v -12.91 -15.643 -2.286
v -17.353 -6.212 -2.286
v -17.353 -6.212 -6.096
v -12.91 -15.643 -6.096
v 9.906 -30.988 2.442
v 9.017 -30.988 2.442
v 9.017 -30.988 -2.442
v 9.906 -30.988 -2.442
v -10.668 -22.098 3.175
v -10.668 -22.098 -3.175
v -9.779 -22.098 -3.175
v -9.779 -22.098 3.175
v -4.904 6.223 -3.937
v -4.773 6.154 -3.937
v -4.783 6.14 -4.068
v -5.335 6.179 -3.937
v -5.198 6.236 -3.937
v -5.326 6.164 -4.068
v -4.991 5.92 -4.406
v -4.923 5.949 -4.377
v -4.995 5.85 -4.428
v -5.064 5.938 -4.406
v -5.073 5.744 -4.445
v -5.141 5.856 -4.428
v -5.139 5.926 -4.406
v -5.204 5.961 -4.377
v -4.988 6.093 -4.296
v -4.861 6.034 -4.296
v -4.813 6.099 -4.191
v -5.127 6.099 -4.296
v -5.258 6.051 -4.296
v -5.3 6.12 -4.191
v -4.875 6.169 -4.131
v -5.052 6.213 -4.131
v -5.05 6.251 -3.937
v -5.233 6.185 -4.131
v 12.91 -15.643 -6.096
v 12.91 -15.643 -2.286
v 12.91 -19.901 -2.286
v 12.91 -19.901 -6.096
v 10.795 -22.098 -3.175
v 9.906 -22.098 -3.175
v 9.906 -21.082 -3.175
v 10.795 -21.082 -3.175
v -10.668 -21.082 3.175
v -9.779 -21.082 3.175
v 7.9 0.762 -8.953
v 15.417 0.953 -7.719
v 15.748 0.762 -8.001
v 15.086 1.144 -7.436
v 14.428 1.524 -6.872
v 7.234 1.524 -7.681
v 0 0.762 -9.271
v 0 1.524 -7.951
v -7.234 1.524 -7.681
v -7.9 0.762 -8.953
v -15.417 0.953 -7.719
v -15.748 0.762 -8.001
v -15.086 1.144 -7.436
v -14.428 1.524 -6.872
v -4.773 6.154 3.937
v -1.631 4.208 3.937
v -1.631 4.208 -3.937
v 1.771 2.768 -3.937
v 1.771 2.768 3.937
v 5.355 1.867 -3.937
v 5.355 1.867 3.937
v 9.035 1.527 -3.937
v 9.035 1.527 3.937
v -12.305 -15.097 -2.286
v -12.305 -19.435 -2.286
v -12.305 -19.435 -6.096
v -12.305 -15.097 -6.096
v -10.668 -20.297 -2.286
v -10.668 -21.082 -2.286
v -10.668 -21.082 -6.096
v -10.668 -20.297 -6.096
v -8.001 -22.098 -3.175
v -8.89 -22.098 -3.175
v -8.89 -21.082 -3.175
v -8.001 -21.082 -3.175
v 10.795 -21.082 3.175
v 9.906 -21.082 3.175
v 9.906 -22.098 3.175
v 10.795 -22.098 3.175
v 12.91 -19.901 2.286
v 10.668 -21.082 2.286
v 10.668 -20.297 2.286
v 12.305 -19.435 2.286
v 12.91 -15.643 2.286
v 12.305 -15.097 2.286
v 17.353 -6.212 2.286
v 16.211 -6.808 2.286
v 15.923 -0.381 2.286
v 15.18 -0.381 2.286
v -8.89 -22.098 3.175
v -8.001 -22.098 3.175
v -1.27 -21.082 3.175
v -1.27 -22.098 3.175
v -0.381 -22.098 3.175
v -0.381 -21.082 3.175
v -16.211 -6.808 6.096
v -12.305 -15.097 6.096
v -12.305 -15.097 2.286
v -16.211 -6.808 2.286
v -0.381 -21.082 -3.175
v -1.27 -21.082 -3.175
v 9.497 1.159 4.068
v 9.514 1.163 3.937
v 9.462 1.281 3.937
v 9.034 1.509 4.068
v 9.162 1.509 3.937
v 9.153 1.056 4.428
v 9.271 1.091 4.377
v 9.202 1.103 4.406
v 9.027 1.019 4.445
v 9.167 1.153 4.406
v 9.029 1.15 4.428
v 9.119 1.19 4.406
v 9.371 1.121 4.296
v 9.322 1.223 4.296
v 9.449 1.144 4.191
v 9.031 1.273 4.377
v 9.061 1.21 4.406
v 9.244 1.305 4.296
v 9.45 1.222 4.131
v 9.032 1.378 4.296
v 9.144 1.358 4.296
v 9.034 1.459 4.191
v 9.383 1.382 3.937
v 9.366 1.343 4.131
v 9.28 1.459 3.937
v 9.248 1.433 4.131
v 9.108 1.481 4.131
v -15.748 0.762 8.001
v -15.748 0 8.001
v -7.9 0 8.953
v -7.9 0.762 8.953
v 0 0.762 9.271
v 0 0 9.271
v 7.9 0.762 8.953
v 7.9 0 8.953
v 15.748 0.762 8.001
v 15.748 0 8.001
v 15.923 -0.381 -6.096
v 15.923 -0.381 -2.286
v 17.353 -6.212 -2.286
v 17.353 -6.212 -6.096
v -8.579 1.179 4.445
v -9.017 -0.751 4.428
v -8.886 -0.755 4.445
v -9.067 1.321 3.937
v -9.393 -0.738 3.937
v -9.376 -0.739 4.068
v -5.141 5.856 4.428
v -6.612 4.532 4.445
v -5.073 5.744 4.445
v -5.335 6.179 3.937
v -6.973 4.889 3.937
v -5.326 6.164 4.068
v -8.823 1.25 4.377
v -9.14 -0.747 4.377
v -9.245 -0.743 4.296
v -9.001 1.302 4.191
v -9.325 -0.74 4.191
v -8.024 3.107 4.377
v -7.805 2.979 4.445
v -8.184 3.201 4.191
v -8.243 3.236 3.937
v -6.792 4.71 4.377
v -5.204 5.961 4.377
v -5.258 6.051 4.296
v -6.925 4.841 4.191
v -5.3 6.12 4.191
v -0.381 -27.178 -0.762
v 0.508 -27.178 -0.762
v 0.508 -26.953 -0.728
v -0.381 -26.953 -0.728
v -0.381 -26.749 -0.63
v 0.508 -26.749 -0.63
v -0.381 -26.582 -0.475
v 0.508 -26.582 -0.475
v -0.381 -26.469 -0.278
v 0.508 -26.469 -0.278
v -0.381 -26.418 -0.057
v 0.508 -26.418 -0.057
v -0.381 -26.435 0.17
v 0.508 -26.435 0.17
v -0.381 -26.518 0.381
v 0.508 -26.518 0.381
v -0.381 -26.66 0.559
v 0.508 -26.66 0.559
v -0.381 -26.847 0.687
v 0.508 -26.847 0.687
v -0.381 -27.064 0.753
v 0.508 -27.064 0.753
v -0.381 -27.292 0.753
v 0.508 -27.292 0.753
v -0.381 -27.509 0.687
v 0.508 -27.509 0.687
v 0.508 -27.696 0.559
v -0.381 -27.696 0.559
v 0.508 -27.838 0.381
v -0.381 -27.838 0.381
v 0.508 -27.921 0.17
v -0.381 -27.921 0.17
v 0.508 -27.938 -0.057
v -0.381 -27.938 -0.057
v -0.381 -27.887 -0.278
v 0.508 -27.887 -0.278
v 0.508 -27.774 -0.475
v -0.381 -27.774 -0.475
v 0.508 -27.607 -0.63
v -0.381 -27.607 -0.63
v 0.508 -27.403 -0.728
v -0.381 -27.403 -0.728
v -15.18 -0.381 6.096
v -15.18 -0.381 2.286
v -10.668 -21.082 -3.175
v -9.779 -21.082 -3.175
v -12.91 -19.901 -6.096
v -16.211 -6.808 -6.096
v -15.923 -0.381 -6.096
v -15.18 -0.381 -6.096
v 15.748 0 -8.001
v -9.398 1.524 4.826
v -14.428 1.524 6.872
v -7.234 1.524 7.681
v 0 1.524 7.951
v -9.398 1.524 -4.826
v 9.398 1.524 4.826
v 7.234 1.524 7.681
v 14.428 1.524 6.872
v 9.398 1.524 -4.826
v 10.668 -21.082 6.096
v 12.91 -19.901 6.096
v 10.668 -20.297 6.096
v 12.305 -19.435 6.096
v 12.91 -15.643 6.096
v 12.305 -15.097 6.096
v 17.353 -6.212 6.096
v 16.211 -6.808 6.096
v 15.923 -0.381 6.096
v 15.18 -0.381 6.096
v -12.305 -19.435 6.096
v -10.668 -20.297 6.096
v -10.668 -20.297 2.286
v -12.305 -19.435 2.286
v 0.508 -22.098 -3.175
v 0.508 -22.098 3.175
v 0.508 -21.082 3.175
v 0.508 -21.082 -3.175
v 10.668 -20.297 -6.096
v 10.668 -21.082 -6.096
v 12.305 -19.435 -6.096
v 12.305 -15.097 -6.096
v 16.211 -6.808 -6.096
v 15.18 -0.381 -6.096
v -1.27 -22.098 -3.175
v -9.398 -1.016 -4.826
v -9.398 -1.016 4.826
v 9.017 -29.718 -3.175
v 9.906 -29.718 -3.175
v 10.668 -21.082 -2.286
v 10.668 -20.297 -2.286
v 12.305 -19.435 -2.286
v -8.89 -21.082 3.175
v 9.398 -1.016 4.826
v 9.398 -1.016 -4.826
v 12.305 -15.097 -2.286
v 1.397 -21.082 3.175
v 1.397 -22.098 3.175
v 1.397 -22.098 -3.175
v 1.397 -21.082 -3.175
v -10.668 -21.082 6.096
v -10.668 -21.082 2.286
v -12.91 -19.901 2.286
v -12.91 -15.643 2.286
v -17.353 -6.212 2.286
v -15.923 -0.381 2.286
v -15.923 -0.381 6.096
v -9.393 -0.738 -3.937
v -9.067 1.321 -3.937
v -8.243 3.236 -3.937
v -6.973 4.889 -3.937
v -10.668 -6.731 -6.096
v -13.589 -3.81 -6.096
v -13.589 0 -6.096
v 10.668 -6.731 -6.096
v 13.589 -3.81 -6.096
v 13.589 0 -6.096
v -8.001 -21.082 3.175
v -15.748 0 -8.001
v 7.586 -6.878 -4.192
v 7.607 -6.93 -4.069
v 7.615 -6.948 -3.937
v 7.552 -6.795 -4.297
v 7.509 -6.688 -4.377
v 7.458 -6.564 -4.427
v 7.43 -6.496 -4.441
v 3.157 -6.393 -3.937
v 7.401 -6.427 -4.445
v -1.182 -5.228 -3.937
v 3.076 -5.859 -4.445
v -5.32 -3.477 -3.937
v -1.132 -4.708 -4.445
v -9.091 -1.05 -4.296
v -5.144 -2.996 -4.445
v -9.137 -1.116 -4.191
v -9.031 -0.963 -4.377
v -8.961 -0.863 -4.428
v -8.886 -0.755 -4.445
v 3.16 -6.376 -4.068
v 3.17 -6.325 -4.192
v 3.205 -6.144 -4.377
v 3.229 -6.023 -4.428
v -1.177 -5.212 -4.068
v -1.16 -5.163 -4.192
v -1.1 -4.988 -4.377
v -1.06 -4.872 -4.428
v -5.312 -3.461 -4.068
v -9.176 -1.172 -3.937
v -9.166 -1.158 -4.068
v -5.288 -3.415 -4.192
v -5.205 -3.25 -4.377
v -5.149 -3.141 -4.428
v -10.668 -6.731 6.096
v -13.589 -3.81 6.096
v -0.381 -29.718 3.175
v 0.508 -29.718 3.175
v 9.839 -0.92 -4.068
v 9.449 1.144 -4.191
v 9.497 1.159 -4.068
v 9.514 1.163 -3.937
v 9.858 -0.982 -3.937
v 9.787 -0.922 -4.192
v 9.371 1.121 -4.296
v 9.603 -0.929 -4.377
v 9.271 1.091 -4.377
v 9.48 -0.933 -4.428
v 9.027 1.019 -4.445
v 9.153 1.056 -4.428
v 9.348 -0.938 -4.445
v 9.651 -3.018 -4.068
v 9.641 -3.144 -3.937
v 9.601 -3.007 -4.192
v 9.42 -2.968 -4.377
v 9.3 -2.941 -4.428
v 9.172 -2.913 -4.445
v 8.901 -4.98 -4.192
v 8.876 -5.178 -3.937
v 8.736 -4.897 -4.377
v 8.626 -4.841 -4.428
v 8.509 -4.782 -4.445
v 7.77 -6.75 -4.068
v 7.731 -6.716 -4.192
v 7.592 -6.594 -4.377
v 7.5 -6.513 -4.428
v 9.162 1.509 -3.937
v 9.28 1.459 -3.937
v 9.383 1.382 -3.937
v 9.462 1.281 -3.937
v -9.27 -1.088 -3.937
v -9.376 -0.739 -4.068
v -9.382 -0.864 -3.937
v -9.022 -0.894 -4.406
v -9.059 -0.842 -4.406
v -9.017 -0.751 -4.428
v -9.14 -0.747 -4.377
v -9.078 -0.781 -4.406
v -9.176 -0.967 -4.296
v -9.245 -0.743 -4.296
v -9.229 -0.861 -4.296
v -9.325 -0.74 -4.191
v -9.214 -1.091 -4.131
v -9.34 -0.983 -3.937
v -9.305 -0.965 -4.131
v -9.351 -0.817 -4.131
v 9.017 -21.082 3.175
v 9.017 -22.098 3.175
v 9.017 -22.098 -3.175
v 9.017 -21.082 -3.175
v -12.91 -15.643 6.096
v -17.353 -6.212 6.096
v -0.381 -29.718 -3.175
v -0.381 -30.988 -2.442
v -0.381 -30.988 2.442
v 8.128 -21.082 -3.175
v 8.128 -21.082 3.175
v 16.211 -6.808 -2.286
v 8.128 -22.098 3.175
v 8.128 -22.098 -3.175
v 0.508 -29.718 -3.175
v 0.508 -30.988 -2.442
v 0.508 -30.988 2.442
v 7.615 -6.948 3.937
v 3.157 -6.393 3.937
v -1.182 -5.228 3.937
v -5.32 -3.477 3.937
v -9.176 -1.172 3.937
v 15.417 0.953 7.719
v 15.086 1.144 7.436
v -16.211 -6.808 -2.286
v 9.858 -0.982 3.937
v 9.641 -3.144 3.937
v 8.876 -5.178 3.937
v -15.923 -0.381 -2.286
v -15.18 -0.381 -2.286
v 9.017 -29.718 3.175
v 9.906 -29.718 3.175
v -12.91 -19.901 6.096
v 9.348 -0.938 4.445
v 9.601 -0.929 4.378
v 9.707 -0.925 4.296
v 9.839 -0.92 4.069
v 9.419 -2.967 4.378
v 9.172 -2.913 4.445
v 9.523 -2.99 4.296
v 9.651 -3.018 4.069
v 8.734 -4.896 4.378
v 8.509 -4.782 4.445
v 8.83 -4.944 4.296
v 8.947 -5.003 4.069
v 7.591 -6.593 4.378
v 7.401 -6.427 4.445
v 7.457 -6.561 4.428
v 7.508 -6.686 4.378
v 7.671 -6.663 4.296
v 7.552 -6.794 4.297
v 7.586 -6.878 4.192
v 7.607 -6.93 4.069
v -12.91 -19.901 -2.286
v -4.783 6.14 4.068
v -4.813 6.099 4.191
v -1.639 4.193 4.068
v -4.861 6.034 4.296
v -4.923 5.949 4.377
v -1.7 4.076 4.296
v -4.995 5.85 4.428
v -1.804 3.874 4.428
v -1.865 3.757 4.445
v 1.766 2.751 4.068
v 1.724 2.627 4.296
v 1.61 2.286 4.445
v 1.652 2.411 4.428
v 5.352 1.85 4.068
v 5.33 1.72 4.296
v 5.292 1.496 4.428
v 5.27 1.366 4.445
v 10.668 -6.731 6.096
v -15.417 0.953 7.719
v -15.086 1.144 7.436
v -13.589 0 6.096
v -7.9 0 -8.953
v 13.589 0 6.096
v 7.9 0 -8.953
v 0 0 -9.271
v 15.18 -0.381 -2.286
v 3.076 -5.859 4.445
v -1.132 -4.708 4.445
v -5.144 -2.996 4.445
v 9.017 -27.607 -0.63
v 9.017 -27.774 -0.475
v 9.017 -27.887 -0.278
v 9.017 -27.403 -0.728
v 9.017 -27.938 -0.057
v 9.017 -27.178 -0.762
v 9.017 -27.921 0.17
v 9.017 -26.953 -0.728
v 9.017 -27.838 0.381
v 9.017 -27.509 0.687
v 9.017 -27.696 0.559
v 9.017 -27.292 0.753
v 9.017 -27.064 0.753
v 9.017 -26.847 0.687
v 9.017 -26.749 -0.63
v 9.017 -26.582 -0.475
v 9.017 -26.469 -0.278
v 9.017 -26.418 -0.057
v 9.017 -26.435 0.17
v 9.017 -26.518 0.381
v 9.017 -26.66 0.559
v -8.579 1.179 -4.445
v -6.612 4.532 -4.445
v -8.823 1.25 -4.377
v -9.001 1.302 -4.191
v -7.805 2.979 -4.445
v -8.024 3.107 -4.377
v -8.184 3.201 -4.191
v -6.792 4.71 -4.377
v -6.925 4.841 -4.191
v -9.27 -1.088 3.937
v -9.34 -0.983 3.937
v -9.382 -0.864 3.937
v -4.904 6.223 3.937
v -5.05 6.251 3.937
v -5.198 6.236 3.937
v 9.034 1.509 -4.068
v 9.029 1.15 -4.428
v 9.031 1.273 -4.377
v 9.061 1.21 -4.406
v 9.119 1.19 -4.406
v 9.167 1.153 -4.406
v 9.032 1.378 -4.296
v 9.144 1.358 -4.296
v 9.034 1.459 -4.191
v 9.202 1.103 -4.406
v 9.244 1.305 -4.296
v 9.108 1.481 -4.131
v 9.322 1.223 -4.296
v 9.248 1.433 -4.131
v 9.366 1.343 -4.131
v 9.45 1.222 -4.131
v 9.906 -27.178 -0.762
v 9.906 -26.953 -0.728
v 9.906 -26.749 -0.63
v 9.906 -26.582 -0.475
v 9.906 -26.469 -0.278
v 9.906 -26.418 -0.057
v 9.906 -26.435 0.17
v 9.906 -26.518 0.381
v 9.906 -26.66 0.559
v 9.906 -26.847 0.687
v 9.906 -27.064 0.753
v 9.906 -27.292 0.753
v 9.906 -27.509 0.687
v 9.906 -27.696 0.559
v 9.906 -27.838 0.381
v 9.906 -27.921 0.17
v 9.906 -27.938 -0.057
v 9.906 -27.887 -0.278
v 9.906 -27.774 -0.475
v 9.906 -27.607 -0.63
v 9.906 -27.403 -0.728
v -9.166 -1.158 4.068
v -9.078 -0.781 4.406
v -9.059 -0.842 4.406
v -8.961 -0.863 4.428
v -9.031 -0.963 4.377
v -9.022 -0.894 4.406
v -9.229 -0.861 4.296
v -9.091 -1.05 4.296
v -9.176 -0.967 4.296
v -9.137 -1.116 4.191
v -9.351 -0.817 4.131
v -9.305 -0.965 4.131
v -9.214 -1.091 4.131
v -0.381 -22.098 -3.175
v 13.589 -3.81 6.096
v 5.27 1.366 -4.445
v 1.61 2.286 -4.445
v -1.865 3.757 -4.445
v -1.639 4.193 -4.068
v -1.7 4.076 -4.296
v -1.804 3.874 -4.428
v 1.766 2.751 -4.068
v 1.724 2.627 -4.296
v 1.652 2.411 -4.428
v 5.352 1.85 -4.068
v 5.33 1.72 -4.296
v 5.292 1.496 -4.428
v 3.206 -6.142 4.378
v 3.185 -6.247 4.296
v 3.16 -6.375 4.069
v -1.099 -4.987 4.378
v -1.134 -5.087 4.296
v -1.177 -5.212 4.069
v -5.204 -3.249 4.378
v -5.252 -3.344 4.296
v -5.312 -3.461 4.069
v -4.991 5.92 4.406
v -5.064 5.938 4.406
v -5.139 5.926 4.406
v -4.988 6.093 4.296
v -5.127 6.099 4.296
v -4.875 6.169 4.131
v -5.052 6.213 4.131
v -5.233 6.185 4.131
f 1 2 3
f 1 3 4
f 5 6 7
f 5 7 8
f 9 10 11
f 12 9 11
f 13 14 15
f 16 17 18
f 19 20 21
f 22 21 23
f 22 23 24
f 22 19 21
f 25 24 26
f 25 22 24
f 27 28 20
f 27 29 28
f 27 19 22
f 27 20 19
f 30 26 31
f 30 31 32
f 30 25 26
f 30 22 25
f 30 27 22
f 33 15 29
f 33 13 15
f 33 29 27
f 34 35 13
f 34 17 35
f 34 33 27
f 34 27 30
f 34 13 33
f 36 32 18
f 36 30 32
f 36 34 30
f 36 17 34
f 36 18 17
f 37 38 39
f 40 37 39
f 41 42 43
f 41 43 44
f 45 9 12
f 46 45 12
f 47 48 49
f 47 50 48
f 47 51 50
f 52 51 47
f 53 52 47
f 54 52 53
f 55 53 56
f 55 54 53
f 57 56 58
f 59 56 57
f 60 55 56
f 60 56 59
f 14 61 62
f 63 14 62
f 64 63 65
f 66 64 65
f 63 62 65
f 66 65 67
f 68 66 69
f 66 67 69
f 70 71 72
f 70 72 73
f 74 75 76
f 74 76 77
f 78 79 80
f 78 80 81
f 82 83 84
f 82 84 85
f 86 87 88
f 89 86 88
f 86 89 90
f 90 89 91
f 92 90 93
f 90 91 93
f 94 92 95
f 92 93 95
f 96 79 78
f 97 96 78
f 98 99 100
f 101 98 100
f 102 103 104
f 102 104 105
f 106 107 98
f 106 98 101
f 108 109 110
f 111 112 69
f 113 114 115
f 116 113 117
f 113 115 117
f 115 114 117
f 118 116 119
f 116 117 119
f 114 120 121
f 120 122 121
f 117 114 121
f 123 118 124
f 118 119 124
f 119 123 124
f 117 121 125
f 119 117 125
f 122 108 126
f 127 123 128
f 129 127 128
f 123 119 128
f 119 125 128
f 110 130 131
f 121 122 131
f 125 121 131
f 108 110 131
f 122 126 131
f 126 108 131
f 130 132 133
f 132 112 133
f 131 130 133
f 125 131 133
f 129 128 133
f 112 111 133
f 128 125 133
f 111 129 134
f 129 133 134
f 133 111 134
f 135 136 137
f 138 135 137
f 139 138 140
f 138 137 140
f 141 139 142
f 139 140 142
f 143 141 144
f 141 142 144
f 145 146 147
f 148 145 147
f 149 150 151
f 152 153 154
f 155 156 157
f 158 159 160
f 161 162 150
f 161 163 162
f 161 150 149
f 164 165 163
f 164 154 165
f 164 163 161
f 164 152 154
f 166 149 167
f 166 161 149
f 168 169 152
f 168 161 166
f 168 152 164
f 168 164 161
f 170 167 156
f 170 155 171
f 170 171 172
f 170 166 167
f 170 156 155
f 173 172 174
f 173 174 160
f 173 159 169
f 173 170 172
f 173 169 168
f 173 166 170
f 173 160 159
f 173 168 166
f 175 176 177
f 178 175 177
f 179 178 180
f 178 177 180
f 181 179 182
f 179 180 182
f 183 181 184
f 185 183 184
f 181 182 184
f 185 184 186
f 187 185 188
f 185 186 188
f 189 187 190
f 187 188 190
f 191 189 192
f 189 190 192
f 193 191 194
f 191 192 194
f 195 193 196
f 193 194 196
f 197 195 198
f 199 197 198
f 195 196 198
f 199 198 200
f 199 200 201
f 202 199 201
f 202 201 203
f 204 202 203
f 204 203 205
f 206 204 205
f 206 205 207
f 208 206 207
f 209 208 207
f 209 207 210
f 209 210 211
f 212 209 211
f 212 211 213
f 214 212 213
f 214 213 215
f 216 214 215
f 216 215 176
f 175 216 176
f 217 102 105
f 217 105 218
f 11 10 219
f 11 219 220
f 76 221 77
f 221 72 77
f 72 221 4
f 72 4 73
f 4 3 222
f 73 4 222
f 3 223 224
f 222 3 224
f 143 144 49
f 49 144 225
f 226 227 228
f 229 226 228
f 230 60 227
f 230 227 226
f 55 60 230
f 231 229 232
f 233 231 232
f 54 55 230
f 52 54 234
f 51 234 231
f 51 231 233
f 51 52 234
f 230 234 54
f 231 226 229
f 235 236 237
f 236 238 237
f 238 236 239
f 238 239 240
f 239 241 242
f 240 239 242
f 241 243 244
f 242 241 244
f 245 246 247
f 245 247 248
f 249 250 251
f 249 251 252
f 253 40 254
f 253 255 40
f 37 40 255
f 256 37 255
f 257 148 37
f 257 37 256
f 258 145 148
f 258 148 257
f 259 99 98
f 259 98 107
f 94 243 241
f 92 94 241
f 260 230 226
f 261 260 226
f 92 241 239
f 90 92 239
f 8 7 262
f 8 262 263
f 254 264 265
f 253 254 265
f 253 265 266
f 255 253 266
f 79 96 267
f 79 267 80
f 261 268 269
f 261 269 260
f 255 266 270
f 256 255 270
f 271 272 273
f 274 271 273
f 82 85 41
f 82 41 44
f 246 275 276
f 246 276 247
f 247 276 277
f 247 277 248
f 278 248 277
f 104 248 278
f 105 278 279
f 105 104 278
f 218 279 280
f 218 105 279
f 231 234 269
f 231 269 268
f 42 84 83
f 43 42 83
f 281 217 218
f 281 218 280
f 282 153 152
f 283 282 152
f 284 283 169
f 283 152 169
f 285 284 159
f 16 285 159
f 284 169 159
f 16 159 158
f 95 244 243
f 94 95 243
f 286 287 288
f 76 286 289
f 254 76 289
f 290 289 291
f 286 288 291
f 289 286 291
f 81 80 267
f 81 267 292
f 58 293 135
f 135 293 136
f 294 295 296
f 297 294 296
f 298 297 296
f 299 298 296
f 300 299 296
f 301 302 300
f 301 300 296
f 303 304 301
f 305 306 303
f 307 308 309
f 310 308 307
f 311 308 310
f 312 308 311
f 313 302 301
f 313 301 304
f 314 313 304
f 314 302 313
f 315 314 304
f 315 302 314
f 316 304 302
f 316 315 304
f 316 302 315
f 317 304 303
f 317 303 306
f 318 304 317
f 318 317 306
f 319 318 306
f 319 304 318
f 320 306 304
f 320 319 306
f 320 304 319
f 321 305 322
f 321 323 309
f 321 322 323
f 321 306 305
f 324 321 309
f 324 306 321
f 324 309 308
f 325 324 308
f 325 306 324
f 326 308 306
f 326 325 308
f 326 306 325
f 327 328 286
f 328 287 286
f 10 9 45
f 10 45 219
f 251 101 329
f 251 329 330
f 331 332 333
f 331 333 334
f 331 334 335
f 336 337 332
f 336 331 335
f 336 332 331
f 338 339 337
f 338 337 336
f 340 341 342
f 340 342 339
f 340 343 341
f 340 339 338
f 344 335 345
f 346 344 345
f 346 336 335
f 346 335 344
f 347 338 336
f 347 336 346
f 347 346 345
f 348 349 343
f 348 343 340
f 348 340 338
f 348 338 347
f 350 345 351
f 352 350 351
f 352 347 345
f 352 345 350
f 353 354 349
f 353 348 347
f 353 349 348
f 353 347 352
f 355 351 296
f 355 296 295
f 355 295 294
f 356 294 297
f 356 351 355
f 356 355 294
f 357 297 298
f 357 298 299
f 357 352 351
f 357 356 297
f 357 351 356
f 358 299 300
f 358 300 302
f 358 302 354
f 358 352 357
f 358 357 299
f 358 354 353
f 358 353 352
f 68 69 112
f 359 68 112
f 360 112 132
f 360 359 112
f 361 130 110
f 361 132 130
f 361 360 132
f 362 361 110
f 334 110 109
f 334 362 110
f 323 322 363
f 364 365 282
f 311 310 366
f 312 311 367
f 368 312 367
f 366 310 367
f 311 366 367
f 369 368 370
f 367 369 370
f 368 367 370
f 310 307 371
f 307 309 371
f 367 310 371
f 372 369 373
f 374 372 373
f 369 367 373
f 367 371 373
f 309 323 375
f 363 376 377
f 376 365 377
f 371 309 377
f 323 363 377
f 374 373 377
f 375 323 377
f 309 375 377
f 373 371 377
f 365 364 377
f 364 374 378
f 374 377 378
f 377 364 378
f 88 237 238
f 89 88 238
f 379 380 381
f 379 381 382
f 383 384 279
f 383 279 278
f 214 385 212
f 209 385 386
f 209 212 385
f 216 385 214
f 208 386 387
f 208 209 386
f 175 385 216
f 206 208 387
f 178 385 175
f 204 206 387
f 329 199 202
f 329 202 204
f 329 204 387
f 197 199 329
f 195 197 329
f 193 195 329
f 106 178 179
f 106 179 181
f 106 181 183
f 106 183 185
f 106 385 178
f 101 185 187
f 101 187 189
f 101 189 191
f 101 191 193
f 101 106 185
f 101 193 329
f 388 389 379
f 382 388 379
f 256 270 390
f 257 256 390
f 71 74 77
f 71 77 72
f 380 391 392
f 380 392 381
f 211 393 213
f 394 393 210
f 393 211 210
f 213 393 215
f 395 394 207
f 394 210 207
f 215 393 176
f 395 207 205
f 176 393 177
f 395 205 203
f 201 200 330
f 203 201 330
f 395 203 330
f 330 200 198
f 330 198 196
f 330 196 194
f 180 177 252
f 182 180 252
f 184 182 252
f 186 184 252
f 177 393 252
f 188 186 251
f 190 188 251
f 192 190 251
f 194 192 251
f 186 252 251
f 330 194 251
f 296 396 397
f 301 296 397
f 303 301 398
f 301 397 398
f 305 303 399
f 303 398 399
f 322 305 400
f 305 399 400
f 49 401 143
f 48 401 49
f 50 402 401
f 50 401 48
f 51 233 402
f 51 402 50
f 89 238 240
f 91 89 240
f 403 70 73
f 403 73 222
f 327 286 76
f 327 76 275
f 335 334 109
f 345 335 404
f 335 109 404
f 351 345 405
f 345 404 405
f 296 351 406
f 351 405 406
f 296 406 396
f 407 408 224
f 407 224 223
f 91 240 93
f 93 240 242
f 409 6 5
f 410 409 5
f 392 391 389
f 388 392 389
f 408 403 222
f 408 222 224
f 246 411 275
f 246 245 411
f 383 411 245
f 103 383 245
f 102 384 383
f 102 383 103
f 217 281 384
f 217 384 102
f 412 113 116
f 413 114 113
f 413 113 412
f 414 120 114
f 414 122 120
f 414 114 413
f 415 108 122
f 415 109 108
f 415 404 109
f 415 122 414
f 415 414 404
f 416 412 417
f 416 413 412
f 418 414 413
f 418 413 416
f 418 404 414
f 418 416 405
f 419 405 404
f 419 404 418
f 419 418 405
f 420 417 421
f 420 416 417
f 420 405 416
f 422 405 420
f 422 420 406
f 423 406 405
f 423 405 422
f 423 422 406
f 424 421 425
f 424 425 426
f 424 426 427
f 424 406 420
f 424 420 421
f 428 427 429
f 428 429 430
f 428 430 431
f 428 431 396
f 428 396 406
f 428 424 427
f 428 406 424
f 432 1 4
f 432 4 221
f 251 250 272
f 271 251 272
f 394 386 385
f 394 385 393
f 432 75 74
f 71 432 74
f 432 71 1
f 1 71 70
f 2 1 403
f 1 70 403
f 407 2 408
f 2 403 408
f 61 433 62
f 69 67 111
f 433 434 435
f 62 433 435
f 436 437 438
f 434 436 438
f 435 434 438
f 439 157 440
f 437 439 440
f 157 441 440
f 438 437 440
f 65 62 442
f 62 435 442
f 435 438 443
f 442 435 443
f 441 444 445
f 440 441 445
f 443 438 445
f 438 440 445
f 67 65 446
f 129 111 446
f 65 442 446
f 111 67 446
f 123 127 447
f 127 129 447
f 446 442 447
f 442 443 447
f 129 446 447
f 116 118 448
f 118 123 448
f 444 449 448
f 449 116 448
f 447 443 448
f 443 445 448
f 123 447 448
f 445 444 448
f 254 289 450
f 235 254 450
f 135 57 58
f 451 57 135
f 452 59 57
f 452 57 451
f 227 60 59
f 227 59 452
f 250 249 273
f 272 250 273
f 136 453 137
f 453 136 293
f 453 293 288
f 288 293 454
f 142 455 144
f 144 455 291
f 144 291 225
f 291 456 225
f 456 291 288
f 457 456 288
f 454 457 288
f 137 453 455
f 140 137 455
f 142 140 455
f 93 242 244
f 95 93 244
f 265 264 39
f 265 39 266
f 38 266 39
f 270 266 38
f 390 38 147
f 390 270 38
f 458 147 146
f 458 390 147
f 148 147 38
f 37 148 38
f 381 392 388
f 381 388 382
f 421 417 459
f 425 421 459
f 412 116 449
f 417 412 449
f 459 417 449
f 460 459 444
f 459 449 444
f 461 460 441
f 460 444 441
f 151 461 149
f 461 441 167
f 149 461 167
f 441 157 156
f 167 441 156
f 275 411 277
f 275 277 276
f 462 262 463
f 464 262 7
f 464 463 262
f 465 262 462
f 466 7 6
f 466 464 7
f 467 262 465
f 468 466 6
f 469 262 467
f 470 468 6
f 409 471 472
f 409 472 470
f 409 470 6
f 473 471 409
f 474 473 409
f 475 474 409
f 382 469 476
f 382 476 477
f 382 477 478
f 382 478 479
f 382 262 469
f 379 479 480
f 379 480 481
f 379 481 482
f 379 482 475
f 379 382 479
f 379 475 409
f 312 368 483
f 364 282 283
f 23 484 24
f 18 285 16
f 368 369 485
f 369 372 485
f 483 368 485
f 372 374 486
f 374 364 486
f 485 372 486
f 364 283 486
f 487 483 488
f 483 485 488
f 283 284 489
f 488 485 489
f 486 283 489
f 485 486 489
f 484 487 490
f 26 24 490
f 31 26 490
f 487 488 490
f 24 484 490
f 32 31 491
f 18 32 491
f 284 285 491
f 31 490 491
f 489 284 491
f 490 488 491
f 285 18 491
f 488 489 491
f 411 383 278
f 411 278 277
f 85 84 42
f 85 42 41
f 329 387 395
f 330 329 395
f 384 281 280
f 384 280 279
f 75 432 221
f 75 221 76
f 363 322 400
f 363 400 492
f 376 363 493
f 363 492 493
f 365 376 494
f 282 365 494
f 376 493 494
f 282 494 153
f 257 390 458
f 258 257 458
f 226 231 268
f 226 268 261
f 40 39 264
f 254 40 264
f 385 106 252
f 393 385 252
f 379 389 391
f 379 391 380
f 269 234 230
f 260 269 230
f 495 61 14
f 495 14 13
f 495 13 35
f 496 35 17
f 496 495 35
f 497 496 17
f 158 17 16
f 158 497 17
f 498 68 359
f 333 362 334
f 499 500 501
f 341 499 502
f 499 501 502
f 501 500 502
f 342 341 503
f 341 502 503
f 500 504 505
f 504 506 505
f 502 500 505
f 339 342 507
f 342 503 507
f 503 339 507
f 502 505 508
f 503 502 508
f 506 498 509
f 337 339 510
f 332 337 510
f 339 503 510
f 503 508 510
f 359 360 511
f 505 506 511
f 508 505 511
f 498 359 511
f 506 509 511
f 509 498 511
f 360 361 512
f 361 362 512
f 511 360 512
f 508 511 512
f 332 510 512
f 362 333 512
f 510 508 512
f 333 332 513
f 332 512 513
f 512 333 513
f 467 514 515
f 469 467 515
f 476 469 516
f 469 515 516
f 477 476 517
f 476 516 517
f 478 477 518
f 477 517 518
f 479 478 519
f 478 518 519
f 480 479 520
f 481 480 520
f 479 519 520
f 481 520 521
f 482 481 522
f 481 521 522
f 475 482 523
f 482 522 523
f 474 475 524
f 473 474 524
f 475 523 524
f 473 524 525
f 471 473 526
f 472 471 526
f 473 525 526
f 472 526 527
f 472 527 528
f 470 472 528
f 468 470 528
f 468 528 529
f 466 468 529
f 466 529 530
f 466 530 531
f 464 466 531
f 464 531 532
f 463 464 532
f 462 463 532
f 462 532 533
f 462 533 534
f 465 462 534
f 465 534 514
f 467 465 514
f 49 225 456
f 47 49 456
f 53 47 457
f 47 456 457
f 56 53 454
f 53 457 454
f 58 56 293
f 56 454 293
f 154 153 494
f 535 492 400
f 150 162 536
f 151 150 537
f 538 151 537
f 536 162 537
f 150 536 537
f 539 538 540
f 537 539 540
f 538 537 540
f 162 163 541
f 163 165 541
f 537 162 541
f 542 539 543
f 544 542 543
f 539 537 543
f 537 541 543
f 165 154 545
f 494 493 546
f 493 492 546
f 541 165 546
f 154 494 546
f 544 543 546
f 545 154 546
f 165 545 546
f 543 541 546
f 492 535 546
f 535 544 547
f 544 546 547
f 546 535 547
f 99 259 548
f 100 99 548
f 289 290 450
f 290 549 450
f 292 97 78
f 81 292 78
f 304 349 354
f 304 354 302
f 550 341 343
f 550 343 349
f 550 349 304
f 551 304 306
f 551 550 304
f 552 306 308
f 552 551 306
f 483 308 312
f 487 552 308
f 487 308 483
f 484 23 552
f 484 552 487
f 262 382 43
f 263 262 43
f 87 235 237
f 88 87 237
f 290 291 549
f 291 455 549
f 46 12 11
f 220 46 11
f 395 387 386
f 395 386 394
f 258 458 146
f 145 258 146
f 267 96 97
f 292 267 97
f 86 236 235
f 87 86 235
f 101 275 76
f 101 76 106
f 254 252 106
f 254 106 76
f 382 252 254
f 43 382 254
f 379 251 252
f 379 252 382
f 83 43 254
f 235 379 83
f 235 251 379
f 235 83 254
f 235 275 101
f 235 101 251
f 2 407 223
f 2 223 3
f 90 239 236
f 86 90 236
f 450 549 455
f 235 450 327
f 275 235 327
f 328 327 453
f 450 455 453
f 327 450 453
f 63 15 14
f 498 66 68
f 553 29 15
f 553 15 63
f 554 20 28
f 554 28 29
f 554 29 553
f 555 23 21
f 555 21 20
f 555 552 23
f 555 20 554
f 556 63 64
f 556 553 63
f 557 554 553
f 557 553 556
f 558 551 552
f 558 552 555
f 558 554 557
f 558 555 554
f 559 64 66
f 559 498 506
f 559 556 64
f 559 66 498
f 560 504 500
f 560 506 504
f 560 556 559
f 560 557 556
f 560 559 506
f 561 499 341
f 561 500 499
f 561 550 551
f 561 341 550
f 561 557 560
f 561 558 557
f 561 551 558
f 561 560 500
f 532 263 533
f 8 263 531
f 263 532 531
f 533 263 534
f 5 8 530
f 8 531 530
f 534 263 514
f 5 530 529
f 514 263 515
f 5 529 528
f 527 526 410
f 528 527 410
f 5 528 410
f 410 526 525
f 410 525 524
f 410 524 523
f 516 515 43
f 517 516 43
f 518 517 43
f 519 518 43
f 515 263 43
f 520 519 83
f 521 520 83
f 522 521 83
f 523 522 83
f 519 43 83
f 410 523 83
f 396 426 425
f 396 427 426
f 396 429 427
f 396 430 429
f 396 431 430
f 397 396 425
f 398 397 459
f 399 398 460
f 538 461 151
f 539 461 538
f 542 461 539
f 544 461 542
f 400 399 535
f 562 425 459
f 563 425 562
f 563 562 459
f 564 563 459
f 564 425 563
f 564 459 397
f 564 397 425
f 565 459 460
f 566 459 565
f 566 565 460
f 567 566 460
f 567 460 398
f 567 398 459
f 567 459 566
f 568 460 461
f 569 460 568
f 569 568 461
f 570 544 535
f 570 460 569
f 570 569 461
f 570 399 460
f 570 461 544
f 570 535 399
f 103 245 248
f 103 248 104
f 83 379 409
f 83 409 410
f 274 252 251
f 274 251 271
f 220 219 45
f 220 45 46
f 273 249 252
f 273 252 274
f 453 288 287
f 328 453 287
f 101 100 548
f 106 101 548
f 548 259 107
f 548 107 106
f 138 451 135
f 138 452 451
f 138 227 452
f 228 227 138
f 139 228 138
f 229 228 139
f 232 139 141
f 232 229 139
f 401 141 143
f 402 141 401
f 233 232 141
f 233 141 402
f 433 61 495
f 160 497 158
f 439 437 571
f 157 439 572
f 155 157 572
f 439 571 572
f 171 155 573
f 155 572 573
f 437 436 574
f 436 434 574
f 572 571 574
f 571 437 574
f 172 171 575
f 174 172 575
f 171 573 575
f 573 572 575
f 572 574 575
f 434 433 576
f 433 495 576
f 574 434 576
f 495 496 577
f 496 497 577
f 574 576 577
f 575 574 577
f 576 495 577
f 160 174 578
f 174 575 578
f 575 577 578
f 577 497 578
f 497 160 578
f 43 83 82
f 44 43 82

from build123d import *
from OCP.BRepFilletAPI import BRepFilletAPI_MakeChamfer

# Parameters (mm, degrees)
EXTRUDE1_DEPTH              = 1.524
SKETCH2_W                   = 21.336
SKETCH2_H                   = 12.192
EXTRUDE2_DEPTH              = 21.082
CHAMFER1_SIZE               = 0.762
CHAMFER1_SIZE2              = 1.319822715
EXTRUDE3_DEPTH              = 6.096
EXTRUDE4_DEPTH              = 6.096
SKETCH5_W                   = 4.572
SKETCH5_H                   = 21.082
CUT_EXTRUDE2_DEPTH          = 36.045787493
SKETCH7_W                   = 0.889
SKETCH7_H                   = 6.35
EXTRUDE5_DEPTH              = 9.906
EXTRUDE6_REACH              = 38.706
SKETCH8_W                   = 0.889
SKETCH8_H                   = 1.016
EXTRUDE6_DIRECTION_2_REACH  = 38.706
CHAMFER2_SIZE               = 1.27
CHAMFER2_SIZE2              = 0.733234842
LPATTERN1_START             = -22.098
LPATTERN1_OUTLINE_W         = 0.889
LPATTERN1_OUTLINE_H         = 6.35
LPATTERN1_DEPTH             = 1.016
LPATTERN2_COUNT             = 2
LPATTERN2_PITCH             = 9.398
CHAMFER2_OF_LPATTERN2_SIZE  = 1.27
CHAMFER2_OF_LPATTERN2_SIZE2 = 0.733234842
SKETCH9_R                   = 0.762
CUT_EXTRUDE3_DEPTH          = 43.299872235
SKETCH10_W                  = 18.796
SKETCH10_H                  = 9.652
CUT_EXTRUDE4_DEPTH          = 2.54
EXTRUDE7_DEPTH              = 4.445
FILLET1_R                   = 0.508


# Read off the part's stored shape, not the designer's step: LPattern1
with BuildPart() as part:
    # Sketch1 → Extrude1 (new body)
    with BuildSketch(Plane(origin=(0, 0, 0), x_dir=(1, 0, 0), z_dir=(0, 1, 0))):
        with BuildLine():
            Line((-15.748, 8.001), (-15.748, -8.001))
            ThreePointArc((-15.748, -8.001), (0, -9.271), (15.748, -8.001))
            Line((15.748, -8.001), (15.748, 8.001))
            ThreePointArc((15.748, 8.001), (0, 9.271), (-15.748, 8.001))
        make_face()
    extrude(amount=EXTRUDE1_DEPTH)

    # Sketch2 → Extrude2 (add)
    with BuildSketch(Plane.XZ):
        Rectangle(SKETCH2_W, SKETCH2_H)
    extrude(amount=EXTRUDE2_DEPTH)

    # Chamfer1: one chamfer whose edges measure the first distance from different faces: ONE call of the kernel's chamfer builder (chamfer() names one face for all edges)
    chamfer1_edges_1 = [part.edges().sort_by_distance(p)[0] for p in [
        (0, 1.524, 9.271),
    ]]
    chamfer1_side_1 = [part.faces().sort_by_distance(p)[0] for p in [
        (0, 0.762, 9.271),
    ]]
    chamfer1_edges_2 = [part.edges().sort_by_distance(p)[0] for p in [
        (15.748, 1.524, 0),
    ]]
    chamfer1_side_2 = [part.faces().sort_by_distance(p)[0] for p in [
        (15.748, 0.762, 0),
    ]]
    chamfer1_edges_3 = [part.edges().sort_by_distance(p)[0] for p in [
        (0, 1.524, -9.271),
    ]]
    chamfer1_side_3 = [part.faces().sort_by_distance(p)[0] for p in [
        (0, 0.762, -9.271),
    ]]
    chamfer1_edges_4 = [part.edges().sort_by_distance(p)[0] for p in [
        (-15.748, 1.524, 0),
    ]]
    chamfer1_side_4 = [part.faces().sort_by_distance(p)[0] for p in [
        (-15.748, 0.762, 0),
    ]]
    chamfer1 = BRepFilletAPI_MakeChamfer(part.part.solid().wrapped)
    for e in chamfer1_edges_1:
        chamfer1.Add(CHAMFER1_SIZE, CHAMFER1_SIZE2, e.wrapped, chamfer1_side_1[0].wrapped)  # the first distance lies on this face
    for e in chamfer1_edges_2:
        chamfer1.Add(CHAMFER1_SIZE, CHAMFER1_SIZE2, e.wrapped, chamfer1_side_2[0].wrapped)  # the first distance lies on this face
    for e in chamfer1_edges_3:
        chamfer1.Add(CHAMFER1_SIZE, CHAMFER1_SIZE2, e.wrapped, chamfer1_side_3[0].wrapped)  # the first distance lies on this face
    for e in chamfer1_edges_4:
        chamfer1.Add(CHAMFER1_SIZE, CHAMFER1_SIZE2, e.wrapped, chamfer1_side_4[0].wrapped)  # the first distance lies on this face
    add(Compound.cast(chamfer1.Shape()), mode=Mode.REPLACE)

    # Sketch3 → Extrude3 (add, symmetric)
    with BuildSketch(Plane.XY):
        Polygon((-13.589, 0), (-13.589, -3.81), (-10.668, -6.731), (-10.668, 0), align=None)
        Polygon((10.668, 0), (13.589, 0), (13.589, -3.81), (10.668, -6.731), align=None)
    extrude(amount=EXTRUDE3_DEPTH, both=True)

    # Sketch7 → Extrude5 (add)
    with BuildSketch(Plane.XZ.offset(21.082)):
        with Locations((9.4615, 0)):
            Rectangle(SKETCH7_W, SKETCH7_H)
    extrude5 = extrude(amount=EXTRUDE5_DEPTH)


with BuildPart() as body_2:
    # Sketch4 → Extrude4 (new, symmetric)
    with BuildSketch(Plane.XY):
        Polygon((-15.922738599, -0.38147822), (-17.353339796, -6.211811304), (-12.909507716, -15.643232471), (-12.909507716, -19.901242285), (-10.668, -21.082), (-10.668, -20.297200236), (-12.305395452, -19.434670387), (-12.305395452, -15.097492601), (-16.211051361, -6.808276188), (-15.179656931, -0.38147822), align=None)
    extrude(amount=EXTRUDE4_DEPTH, both=True)

    # Sketch5 → Cut-Extrude2 (cut, through all)
    with BuildSketch(Plane.ZY.offset(10.668)):
        with Locations((0, -10.541)):
            Rectangle(SKETCH5_W, SKETCH5_H)
    extrude(amount=CUT_EXTRUDE2_DEPTH, mode=Mode.SUBTRACT)


with BuildPart() as cut_extrude2_piece_1:
    # of the separate pieces the step leaves, piece 1, a body of its own (cut_extrude2_pieces)
    add(body_2.part.solids().sort_by_distance((-15.922738599, -0.38147822, 6.096))[0])


with BuildPart() as cut_extrude2_piece_2:
    # of the separate pieces the step leaves, piece 2, a body of its own (cut_extrude2_pieces)
    add(body_2.part.solids().sort_by_distance((-15.922738599, -0.38147822, -2.286))[0])


with BuildPart() as body_4:
    # Mirror1: mirrored copy
    add(cut_extrude2_piece_1.part.mirror(Plane(origin=(0, 0, 0), x_dir=(0, 0, 1), z_dir=(1, 0, 0))))


with BuildPart() as body_5:
    # Mirror1 2: mirrored copy
    add(cut_extrude2_piece_2.part.mirror(Plane(origin=(0, 0, 0), x_dir=(0, 0, 1), z_dir=(1, 0, 0))))


with BuildPart() as body_6:

    # Extrude6: up to this face of the body (flat: up to its plane)
    extrude6_end = Plane(part.part.faces().sort_by_distance((9.4615, -26.035, 3.175))[0])
    # Sketch8 → Extrude6 (new, up to the picked face)
    with BuildSketch(Plane.XY, mode=Mode.PRIVATE) as extrude6_sk1:
        with Locations((10.3505, -21.59)):
            Rectangle(SKETCH8_W, SKETCH8_H)
    extrude6_tool1 = split(extrude(extrude6_sk1.sketch, amount=EXTRUDE6_REACH, mode=Mode.PRIVATE), bisect_by=extrude6_end, keep=Keep.BOTH, mode=Mode.PRIVATE)
    # Sketch8 → Extrude6 (new, up to the picked face)
    with BuildSketch(Plane.XY, mode=Mode.PRIVATE) as extrude6_sk2:
        with Locations((8.5725, -21.59)):
            Rectangle(SKETCH8_W, SKETCH8_H)
    extrude6_tool2 = split(extrude(extrude6_sk2.sketch, amount=EXTRUDE6_REACH, mode=Mode.PRIVATE), bisect_by=extrude6_end, keep=Keep.BOTH, mode=Mode.PRIVATE)
    add(extrude6_tool1.solids().sort_by(Axis((10.3505, -21.59, 0), (0, 0, 1)))[0])
    add(extrude6_tool2.solids().sort_by(Axis((8.5725, -21.59, 0), (0, 0, 1)))[0])


    # Extrude6 direction 2: up to this face of the body (flat: up to its plane)
    extrude6_direction_2_end = Plane(part.part.faces().sort_by_distance((9.4615, -26.035, -3.175))[0])
    # Sketch8 → Extrude6 direction 2 (add, up to the picked face)
    with BuildSketch(Plane.XY, mode=Mode.PRIVATE) as extrude6_direction_2_sk1:
        with Locations((10.3505, -21.59)):
            Rectangle(SKETCH8_W, SKETCH8_H)
    extrude6_direction_2_tool1 = split(extrude(extrude6_direction_2_sk1.sketch, amount=-EXTRUDE6_DIRECTION_2_REACH, mode=Mode.PRIVATE), bisect_by=extrude6_direction_2_end, keep=Keep.BOTH, mode=Mode.PRIVATE)
    # Sketch8 → Extrude6 direction 2 (add, up to the picked face)
    with BuildSketch(Plane.XY, mode=Mode.PRIVATE) as extrude6_direction_2_sk2:
        with Locations((8.5725, -21.59)):
            Rectangle(SKETCH8_W, SKETCH8_H)
    extrude6_direction_2_tool2 = split(extrude(extrude6_direction_2_sk2.sketch, amount=-EXTRUDE6_DIRECTION_2_REACH, mode=Mode.PRIVATE), bisect_by=extrude6_direction_2_end, keep=Keep.BOTH, mode=Mode.PRIVATE)
    add(extrude6_direction_2_tool1.solids().sort_by(Axis((10.3505, -21.59, 0), (0, 0, -1)))[0])
    add(extrude6_direction_2_tool2.solids().sort_by(Axis((8.5725, -21.59, 0), (0, 0, -1)))[0])


with BuildPart() as part_1:
    add(part.part)

    # Chamfer2: one chamfer whose edges measure the first distance from different faces: ONE call of the kernel's chamfer builder (chamfer() names one face for all edges)
    chamfer2_edges_1 = [part_1.edges().sort_by_distance(p)[0] for p in [
        (9.4615, -30.988, 3.175),
    ]]
    chamfer2_side_1 = [part_1.faces().sort_by_distance(p)[0] for p in [
        (9.4615, -26.035, 3.175),
    ]]
    chamfer2_edges_2 = [part_1.edges().sort_by_distance(p)[0] for p in [
        (9.4615, -30.988, -3.175),
    ]]
    chamfer2_side_2 = [part_1.faces().sort_by_distance(p)[0] for p in [
        (9.4615, -26.035, -3.175),
    ]]
    chamfer2 = BRepFilletAPI_MakeChamfer(part_1.part.solid().wrapped)
    for e in chamfer2_edges_1:
        chamfer2.Add(CHAMFER2_SIZE, CHAMFER2_SIZE2, e.wrapped, chamfer2_side_1[0].wrapped)  # the first distance lies on this face
    for e in chamfer2_edges_2:
        chamfer2.Add(CHAMFER2_SIZE, CHAMFER2_SIZE2, e.wrapped, chamfer2_side_2[0].wrapped)  # the first distance lies on this face
    add(Compound.cast(chamfer2.Shape()), mode=Mode.REPLACE)

    # LPattern2: Extrude5 ×2
    with Locations(*[(-i * LPATTERN2_PITCH, 0, 0) for i in range(1, LPATTERN2_COUNT)]):
        add(extrude5)

    # Chamfer2 of LPattern2: one chamfer whose edges measure the first distance from different faces: ONE call of the kernel's chamfer builder (chamfer() names one face for all edges)
    chamfer2_of_lpattern2_edges_1 = [part_1.edges().sort_by_distance(p)[0] for p in [
        (0.0635, -30.988, 3.175),
    ]]
    chamfer2_of_lpattern2_side_1 = [part_1.faces().sort_by_distance(p)[0] for p in [
        (0.0635, -26.035, 3.175),
    ]]
    chamfer2_of_lpattern2_edges_2 = [part_1.edges().sort_by_distance(p)[0] for p in [
        (0.0635, -30.988, -3.175),
    ]]
    chamfer2_of_lpattern2_side_2 = [part_1.faces().sort_by_distance(p)[0] for p in [
        (0.0635, -26.035, -3.175),
    ]]
    chamfer2_of_lpattern2 = BRepFilletAPI_MakeChamfer(part_1.part.solid().wrapped)
    for e in chamfer2_of_lpattern2_edges_1:
        chamfer2_of_lpattern2.Add(CHAMFER2_OF_LPATTERN2_SIZE, CHAMFER2_OF_LPATTERN2_SIZE2, e.wrapped, chamfer2_of_lpattern2_side_1[0].wrapped)  # the first distance lies on this face
    for e in chamfer2_of_lpattern2_edges_2:
        chamfer2_of_lpattern2.Add(CHAMFER2_OF_LPATTERN2_SIZE, CHAMFER2_OF_LPATTERN2_SIZE2, e.wrapped, chamfer2_of_lpattern2_side_2[0].wrapped)  # the first distance lies on this face
    add(Compound.cast(chamfer2_of_lpattern2.Shape()), mode=Mode.REPLACE)

    # Sketch9 → Cut-Extrude3 (cut, through all)
    with BuildSketch(Plane(origin=(9.906, 0, 0), x_dir=(0, 0, -1), z_dir=(1, 0, 0))):
        with Locations((0, -27.178)):
            Circle(SKETCH9_R)
    extrude(amount=-CUT_EXTRUDE3_DEPTH, mode=Mode.SUBTRACT)

    # Sketch10 → Cut-Extrude4 (cut)
    with BuildSketch(Plane(origin=(0, 1.524, 0), x_dir=(-1, 0, 0), z_dir=(0, 1, 0))):
        Rectangle(SKETCH10_W, SKETCH10_H)
    extrude(amount=-CUT_EXTRUDE4_DEPTH, mode=Mode.SUBTRACT)


with BuildPart() as body_7:
    # LPattern1 outline → LPattern1 (new body)
    with BuildSketch(Plane(origin=(0, 0, 0), x_dir=(1, 0, 0), z_dir=(0, 1, 0)).offset(LPATTERN1_START)):
        with Locations((-10.2235, 0)):
            Rectangle(LPATTERN1_OUTLINE_W, LPATTERN1_OUTLINE_H)
        with Locations((-0.8255, 0)):
            Rectangle(LPATTERN1_OUTLINE_W, LPATTERN1_OUTLINE_H)
        with Locations((-8.4455, 0)):
            Rectangle(LPATTERN1_OUTLINE_W, LPATTERN1_OUTLINE_H)
        with Locations((0.9525, 0)):
            Rectangle(LPATTERN1_OUTLINE_W, LPATTERN1_OUTLINE_H)
    extrude(amount=LPATTERN1_DEPTH)


with BuildPart() as body_8:
    # Sketch11 → Extrude7 (new, symmetric)
    with BuildSketch(Plane.XY):
        with BuildLine():
            ThreePointArc((-5.037600642, 6.35), (1.787532835, 2.762449285), (9.398, 1.524))
            ThreePointArc((9.398, 1.524), (9.681599152, -2.959513535), (7.614590321, -6.948222173))
            ThreePointArc((7.614590321, -6.948222173), (-1.310680622, -5.183661388), (-9.398, -1.016))
            ThreePointArc((-9.398, -1.016), (-8.226182947, 3.263925191), (-5.037600642, 6.35))
        make_face()
    extrude(amount=EXTRUDE7_DEPTH, both=True)

    # Fillet1
    fillet1_edges = [body_8.edges().sort_by_distance(p)[0] for p in [
        (9.681599152, -2.959513535, 4.445),
        (1.787532835, 2.762449285, 4.445),
        (-8.226182947, 3.263925191, 4.445),
        (1.787532835, 2.762449285, -4.445),
        (9.681599152, -2.959513535, -4.445),
        (-1.310680622, -5.183661388, -4.445),
        (-8.226182947, 3.263925191, -4.445),
        (-1.310680622, -5.183661388, 4.445),
        (-5.037600642, 6.35, 0),
        (9.398, 1.524, 0),
        (-9.398, -1.016, 0),
    ]]
    fillet(fillet1_edges, radius=FILLET1_R)


solid = Compound([cut_extrude2_piece_1.part, cut_extrude2_piece_2.part, body_4.part, body_5.part, body_6.part, part_1.part, body_7.part, body_8.part])
